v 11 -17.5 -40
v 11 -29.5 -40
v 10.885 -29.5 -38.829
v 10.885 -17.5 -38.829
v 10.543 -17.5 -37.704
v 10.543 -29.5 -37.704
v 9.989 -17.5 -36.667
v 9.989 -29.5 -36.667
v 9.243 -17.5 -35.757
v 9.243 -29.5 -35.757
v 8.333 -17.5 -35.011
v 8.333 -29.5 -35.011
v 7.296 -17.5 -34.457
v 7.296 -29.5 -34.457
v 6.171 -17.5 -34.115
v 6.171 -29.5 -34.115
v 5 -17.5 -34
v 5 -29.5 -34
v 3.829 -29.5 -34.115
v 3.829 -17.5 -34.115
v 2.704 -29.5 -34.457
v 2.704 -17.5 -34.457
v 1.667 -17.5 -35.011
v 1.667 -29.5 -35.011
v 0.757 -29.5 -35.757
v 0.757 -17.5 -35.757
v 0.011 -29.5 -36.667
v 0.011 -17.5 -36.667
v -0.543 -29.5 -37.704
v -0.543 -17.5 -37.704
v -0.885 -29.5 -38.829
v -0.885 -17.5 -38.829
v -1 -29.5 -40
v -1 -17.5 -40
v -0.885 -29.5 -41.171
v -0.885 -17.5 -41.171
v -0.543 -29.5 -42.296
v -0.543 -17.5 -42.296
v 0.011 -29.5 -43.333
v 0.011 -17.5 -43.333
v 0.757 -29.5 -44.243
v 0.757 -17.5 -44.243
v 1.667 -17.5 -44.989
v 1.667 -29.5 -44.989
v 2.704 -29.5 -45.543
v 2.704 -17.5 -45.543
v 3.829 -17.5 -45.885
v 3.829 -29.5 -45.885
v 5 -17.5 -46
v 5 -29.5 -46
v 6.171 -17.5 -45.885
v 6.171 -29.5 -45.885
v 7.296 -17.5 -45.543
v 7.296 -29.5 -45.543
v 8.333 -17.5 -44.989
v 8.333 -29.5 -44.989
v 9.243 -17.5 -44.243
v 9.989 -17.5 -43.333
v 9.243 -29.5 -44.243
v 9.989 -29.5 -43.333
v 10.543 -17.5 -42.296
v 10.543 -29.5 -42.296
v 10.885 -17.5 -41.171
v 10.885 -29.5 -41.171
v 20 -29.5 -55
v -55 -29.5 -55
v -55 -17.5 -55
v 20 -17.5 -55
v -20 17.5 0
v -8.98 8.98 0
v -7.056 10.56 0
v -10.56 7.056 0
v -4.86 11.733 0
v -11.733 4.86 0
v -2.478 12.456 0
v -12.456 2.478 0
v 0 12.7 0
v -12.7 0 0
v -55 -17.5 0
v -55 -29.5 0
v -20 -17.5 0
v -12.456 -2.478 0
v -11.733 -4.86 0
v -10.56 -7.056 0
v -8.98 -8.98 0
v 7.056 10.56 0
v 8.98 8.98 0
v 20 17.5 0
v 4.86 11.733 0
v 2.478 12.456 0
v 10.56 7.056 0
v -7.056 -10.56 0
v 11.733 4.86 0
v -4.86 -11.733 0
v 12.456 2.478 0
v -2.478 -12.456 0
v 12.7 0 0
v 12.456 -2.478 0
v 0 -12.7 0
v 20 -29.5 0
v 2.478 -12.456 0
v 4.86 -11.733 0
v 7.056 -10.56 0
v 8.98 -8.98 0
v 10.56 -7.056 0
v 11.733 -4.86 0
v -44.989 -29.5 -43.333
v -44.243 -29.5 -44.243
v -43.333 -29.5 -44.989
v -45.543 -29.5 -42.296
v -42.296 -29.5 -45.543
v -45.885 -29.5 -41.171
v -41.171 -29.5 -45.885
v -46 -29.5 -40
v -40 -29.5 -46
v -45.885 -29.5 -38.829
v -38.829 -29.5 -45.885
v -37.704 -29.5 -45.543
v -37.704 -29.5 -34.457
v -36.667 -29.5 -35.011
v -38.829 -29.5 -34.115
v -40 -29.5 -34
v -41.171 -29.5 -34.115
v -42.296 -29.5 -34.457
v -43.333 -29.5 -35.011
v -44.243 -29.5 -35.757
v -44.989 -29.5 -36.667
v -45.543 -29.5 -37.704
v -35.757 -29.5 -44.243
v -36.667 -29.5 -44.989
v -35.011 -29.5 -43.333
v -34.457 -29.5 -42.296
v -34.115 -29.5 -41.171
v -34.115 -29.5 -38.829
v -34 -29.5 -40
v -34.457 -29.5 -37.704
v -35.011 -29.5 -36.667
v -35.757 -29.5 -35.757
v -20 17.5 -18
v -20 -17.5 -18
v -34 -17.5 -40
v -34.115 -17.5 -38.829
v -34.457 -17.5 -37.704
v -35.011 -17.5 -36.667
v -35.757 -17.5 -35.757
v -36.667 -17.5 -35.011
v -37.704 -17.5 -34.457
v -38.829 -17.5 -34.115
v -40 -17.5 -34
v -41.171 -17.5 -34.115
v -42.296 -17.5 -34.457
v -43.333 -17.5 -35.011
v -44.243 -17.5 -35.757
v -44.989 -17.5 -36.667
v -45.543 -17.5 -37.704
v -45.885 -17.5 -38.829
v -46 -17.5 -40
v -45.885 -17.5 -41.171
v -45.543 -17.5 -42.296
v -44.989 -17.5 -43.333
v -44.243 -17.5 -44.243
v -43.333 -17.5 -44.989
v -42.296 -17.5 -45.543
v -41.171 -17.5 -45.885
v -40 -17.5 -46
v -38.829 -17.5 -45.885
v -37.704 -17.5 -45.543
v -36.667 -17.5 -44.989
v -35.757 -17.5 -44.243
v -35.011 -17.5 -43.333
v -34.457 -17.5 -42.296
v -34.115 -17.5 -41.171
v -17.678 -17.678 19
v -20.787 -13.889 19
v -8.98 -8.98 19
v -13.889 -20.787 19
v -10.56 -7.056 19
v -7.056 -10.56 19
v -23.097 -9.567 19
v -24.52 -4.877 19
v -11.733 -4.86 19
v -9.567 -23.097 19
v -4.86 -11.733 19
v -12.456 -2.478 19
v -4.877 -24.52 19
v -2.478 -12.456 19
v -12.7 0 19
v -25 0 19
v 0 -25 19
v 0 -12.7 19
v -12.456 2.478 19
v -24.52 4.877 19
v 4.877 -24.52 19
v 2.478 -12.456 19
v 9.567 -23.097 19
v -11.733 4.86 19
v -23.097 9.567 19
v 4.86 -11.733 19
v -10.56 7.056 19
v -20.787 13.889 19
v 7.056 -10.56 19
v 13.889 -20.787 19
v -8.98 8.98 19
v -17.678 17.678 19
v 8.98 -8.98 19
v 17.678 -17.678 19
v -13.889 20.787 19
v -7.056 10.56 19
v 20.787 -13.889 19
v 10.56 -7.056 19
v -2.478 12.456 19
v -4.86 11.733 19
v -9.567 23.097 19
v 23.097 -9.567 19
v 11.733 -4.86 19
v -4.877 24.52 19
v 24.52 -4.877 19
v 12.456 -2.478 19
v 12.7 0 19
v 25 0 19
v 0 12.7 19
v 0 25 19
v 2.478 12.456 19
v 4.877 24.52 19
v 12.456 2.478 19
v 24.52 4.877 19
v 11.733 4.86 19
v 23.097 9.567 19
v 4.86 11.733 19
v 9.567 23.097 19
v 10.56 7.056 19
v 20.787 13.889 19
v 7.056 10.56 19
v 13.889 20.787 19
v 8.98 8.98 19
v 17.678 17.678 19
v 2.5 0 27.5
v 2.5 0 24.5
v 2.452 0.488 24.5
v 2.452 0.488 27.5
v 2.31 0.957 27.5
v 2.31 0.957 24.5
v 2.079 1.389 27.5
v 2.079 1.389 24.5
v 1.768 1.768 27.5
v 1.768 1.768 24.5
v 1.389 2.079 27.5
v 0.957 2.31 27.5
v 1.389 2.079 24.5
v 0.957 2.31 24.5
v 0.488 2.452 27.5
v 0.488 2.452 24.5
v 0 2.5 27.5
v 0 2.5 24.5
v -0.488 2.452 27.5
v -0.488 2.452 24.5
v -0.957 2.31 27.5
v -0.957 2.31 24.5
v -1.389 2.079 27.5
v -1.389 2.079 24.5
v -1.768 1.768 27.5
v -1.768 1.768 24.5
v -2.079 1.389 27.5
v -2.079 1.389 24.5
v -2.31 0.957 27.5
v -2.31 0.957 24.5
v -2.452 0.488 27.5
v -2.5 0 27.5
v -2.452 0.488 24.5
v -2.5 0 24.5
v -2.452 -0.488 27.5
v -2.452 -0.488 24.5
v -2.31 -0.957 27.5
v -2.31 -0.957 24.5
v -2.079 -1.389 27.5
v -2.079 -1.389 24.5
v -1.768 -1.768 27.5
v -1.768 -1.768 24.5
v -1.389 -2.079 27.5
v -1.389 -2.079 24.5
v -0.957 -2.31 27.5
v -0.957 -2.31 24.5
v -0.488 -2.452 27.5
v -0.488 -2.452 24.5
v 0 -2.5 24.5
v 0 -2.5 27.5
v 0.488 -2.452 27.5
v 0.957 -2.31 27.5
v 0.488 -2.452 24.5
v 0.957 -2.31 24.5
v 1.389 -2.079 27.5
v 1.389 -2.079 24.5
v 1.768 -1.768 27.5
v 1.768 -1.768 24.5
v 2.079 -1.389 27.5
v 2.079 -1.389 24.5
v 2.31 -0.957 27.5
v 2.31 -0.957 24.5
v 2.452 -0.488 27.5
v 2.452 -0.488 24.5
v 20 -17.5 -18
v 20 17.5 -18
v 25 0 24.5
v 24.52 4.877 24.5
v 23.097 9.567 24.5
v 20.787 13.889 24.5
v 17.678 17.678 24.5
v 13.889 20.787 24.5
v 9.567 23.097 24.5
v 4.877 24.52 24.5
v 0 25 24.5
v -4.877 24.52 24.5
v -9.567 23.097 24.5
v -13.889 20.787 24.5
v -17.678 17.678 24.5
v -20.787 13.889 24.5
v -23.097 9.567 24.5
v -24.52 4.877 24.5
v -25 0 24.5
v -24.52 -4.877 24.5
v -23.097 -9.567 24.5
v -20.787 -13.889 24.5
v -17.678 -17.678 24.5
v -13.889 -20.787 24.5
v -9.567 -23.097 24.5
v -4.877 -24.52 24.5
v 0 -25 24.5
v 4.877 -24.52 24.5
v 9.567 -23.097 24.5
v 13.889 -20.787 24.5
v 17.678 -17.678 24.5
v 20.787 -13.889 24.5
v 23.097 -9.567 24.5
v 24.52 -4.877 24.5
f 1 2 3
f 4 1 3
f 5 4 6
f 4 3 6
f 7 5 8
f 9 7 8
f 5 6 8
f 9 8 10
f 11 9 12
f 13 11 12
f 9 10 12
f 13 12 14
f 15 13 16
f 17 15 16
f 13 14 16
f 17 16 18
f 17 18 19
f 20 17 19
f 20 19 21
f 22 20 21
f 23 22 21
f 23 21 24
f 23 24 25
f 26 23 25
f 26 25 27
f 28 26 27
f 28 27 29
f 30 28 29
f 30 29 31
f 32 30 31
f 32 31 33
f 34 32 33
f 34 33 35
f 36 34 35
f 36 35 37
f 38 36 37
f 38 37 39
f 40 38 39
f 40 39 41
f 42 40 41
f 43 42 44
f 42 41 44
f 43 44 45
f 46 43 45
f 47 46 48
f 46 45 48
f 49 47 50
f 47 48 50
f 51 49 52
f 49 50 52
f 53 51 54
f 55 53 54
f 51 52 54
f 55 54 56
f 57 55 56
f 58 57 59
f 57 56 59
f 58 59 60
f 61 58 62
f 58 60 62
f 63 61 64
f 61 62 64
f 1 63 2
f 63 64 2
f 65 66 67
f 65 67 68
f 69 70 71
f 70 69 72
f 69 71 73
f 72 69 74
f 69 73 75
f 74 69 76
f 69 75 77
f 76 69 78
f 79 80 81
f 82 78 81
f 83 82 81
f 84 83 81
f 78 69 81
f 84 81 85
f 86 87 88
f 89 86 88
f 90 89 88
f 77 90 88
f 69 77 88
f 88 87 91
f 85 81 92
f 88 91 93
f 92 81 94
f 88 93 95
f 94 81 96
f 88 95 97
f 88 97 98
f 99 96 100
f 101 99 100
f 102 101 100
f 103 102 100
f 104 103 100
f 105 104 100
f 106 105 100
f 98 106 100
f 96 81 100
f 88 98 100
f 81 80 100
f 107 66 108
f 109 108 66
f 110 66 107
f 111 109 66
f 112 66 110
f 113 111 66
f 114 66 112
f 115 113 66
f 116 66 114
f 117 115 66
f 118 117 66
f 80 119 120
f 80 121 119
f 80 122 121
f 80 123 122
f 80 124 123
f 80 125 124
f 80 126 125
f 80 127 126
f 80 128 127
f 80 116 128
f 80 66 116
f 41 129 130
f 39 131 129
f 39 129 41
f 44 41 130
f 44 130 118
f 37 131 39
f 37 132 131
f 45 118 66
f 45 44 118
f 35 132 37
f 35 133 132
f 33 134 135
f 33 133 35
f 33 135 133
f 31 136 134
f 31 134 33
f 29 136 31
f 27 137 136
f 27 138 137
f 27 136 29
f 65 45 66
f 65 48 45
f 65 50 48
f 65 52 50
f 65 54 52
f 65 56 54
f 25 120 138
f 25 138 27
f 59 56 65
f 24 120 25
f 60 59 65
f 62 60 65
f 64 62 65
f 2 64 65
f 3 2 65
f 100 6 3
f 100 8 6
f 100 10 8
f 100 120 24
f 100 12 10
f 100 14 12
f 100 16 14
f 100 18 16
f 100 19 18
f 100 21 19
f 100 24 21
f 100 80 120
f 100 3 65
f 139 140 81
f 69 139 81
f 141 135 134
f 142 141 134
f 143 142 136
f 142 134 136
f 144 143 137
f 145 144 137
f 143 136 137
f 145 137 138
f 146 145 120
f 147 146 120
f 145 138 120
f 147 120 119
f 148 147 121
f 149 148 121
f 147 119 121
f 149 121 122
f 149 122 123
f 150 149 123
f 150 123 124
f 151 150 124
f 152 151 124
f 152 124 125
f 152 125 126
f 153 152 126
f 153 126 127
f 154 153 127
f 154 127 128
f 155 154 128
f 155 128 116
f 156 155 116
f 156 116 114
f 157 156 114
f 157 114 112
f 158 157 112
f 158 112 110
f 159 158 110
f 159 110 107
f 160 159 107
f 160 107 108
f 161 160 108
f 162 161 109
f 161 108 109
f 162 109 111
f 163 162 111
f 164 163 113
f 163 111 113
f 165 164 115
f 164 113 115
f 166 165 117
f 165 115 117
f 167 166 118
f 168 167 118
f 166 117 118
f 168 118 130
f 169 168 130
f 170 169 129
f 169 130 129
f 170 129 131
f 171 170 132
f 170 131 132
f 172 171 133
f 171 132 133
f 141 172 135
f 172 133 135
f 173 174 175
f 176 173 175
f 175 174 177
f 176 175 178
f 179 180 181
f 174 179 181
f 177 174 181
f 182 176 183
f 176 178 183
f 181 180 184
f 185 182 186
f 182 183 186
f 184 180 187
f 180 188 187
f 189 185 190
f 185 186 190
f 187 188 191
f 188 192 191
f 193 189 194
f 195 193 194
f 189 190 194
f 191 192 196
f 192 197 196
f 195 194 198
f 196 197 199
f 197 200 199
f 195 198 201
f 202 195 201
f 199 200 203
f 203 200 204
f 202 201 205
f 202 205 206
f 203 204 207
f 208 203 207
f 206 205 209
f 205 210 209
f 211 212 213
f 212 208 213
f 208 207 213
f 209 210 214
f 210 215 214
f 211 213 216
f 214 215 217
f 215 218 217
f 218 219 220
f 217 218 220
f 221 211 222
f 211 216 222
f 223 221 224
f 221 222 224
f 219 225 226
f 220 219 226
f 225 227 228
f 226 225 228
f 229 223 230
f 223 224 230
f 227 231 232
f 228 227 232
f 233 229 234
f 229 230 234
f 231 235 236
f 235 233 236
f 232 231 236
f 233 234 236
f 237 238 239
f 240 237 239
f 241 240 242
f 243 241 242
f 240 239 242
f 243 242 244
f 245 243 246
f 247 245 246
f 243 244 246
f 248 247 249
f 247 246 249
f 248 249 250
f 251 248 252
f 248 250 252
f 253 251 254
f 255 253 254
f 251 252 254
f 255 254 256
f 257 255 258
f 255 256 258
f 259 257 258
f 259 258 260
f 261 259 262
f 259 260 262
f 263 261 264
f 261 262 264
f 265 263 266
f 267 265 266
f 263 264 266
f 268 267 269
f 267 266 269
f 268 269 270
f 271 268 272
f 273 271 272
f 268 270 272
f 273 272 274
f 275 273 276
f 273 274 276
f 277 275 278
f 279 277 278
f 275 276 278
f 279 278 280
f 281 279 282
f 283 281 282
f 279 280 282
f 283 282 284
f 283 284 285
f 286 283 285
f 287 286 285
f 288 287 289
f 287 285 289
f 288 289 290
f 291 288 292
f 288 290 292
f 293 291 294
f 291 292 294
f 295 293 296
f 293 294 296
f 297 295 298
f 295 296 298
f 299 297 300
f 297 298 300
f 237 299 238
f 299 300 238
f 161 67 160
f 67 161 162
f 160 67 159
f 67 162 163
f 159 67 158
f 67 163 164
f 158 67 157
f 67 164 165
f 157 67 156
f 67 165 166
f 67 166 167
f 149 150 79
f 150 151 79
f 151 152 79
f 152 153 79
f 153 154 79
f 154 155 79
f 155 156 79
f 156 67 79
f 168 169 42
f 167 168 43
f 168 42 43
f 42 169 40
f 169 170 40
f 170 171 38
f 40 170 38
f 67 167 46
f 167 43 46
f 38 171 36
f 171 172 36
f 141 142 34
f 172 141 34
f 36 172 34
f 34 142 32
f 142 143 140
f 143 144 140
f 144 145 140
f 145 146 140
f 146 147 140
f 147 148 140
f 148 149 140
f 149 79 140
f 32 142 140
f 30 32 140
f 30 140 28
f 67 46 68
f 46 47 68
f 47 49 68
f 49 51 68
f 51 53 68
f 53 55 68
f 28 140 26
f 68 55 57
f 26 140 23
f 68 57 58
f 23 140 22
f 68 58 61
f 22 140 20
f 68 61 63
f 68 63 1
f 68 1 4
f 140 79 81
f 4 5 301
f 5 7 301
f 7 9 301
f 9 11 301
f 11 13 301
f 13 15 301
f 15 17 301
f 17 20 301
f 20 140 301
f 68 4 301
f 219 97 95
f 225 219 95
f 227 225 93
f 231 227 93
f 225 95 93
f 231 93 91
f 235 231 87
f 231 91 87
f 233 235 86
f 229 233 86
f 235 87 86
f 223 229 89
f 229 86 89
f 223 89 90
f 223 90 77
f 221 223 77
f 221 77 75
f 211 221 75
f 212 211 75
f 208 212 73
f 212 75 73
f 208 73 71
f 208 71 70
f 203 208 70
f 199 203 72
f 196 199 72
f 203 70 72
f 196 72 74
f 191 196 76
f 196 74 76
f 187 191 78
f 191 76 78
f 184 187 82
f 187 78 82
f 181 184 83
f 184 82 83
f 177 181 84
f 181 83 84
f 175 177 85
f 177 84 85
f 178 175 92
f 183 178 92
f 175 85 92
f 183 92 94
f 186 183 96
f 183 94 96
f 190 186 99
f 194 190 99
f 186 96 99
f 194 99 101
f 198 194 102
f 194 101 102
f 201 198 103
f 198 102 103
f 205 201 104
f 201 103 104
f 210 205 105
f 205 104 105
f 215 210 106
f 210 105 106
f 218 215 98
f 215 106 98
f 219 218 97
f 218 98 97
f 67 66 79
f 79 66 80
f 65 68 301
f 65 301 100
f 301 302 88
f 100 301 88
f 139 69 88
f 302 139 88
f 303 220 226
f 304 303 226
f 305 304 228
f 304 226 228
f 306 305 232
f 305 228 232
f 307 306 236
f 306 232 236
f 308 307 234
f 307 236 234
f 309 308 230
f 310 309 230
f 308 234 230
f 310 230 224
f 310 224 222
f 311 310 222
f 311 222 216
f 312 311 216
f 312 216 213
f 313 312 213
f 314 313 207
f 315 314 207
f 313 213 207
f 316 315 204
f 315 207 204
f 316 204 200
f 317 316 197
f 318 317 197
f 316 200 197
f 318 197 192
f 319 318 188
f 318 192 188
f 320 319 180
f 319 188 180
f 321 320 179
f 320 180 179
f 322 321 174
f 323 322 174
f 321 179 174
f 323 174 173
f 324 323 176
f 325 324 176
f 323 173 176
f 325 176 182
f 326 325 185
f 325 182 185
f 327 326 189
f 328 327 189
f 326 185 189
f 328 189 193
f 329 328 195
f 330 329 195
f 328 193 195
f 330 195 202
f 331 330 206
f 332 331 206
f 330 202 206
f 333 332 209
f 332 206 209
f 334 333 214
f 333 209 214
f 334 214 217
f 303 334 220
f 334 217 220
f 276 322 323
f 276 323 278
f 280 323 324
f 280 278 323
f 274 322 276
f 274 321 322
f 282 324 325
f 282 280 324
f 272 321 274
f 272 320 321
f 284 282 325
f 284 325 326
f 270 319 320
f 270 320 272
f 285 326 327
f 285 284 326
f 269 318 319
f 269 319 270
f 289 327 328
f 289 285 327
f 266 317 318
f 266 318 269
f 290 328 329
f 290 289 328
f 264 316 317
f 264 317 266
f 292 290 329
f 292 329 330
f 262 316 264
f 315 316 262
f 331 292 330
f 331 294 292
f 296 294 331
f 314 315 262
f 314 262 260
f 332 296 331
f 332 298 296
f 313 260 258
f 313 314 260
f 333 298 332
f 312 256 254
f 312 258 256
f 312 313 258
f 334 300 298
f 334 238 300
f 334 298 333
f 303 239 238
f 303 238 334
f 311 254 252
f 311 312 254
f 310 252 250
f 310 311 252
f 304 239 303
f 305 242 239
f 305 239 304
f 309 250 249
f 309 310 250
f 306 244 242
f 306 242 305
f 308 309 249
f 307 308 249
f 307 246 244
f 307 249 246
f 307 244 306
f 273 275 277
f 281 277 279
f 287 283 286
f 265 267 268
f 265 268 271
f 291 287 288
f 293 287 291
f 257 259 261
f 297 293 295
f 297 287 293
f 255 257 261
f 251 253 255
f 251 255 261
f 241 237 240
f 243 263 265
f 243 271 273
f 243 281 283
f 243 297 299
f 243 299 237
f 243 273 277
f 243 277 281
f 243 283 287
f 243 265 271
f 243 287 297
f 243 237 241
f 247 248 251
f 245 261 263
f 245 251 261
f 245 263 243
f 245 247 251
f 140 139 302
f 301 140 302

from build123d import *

# Parameters (mm, degrees)
F0_W      = 100
F0_H      = 35
F1_DEPTH  = 18
F3_D      = 12
F4_R      = 12.7
F5_DEPTH  = 19
F6_R      = 25
F6_R_2    = 12.7
F7_DEPTH  = 5.5
F8_R      = 2.5
F9_DEPTH  = 3
F10_W     = 100
F10_H     = 57
F10_H_2   = 18
F11_DEPTH = 12
F12_W     = 30
F12_H     = 35
F13_DEPTH = 25
F14_W     = 30
F14_H     = 75
F15_DEPTH = 25
F16_W     = 75
F16_H     = 55
F17_DEPTH = 12
F18_W     = 40
F18_H     = 20
F19_DEPTH = 25
F21_D     = 12


with BuildPart() as f1:
    # F0 (on Top) → F1 (new body)
    with BuildSketch(Plane.XY):
        Rectangle(F0_W, F0_H)
    extrude(amount=-F1_DEPTH)

    # F3 (through all)
    with Locations(Plane.XY):
        with Locations((-38, 0), (38, 0)):
            Hole(F3_D / 2)

    # F4 (on face) → F5 (join)
    with BuildSketch(Plane.XY):
        Circle(F4_R)
    extrude(amount=F5_DEPTH)

    # F6 (on face) → F7 (join)
    with BuildSketch(Plane.XY.offset(19)):
        Circle(F6_R)
        Circle(F6_R_2, mode=Mode.SUBTRACT)
        Circle(F6_R_2)
    extrude(amount=F7_DEPTH)

    # F8 (on face) → F9 (join)
    with BuildSketch(Plane.XY.offset(24.5)):
        Circle(F8_R)
    extrude(amount=F9_DEPTH)

    # F10 (on face) → F11 (join)
    with BuildSketch(Plane.XZ.offset(17.5)):
        with Locations((0, -46.5)):
            Rectangle(F10_W, F10_H)
        with Locations((0, -9)):
            Rectangle(F10_W, F10_H_2)
    extrude(amount=F11_DEPTH)

    # F12 (on face) → F13 (cut)
    with BuildSketch(Plane(origin=(0, 0, -18), x_dir=(1, 0, 0), z_dir=(0, 0, -1))):
        with Locations((35, 0)):
            Rectangle(F12_W, F12_H)
        with Locations((-35, 0)):
            Rectangle(F12_W, F12_H)
    extrude(amount=-F13_DEPTH, mode=Mode.SUBTRACT)

    # F14 (on face) → F15 (cut)
    with BuildSketch(Plane(origin=(0, -17.5, 0), x_dir=(-1, 0, 0), z_dir=(0, 1, 0))):
        with Locations((-35, -37.5)):
            Rectangle(F14_W, F14_H)
        with Locations((35, -37.5)):
            Rectangle(F14_W, F14_H)
    extrude(amount=-F15_DEPTH, mode=Mode.SUBTRACT)

    # F16 (on face) → F17 (join)
    with BuildSketch(Plane.XZ.offset(29.5)):
        with Locations((-17.5, -27.5)):
            Rectangle(F16_W, F16_H)
    extrude(amount=-F17_DEPTH)

    # F18 (on face) → F19 (cut)
    with BuildSketch(Plane.XZ.offset(29.5)):
        with Locations((0, -65)):
            Rectangle(F18_W, F18_H)
    extrude(amount=-F19_DEPTH, mode=Mode.SUBTRACT)

    # F21 (through all)
    with Locations(Plane(origin=(0, -17.5, 0), x_dir=(-1, 0, 0), z_dir=(0, 1, 0))):
        with Locations((-5, -40), (40, -40)):
            Hole(F21_D / 2)


solid = f1.part
